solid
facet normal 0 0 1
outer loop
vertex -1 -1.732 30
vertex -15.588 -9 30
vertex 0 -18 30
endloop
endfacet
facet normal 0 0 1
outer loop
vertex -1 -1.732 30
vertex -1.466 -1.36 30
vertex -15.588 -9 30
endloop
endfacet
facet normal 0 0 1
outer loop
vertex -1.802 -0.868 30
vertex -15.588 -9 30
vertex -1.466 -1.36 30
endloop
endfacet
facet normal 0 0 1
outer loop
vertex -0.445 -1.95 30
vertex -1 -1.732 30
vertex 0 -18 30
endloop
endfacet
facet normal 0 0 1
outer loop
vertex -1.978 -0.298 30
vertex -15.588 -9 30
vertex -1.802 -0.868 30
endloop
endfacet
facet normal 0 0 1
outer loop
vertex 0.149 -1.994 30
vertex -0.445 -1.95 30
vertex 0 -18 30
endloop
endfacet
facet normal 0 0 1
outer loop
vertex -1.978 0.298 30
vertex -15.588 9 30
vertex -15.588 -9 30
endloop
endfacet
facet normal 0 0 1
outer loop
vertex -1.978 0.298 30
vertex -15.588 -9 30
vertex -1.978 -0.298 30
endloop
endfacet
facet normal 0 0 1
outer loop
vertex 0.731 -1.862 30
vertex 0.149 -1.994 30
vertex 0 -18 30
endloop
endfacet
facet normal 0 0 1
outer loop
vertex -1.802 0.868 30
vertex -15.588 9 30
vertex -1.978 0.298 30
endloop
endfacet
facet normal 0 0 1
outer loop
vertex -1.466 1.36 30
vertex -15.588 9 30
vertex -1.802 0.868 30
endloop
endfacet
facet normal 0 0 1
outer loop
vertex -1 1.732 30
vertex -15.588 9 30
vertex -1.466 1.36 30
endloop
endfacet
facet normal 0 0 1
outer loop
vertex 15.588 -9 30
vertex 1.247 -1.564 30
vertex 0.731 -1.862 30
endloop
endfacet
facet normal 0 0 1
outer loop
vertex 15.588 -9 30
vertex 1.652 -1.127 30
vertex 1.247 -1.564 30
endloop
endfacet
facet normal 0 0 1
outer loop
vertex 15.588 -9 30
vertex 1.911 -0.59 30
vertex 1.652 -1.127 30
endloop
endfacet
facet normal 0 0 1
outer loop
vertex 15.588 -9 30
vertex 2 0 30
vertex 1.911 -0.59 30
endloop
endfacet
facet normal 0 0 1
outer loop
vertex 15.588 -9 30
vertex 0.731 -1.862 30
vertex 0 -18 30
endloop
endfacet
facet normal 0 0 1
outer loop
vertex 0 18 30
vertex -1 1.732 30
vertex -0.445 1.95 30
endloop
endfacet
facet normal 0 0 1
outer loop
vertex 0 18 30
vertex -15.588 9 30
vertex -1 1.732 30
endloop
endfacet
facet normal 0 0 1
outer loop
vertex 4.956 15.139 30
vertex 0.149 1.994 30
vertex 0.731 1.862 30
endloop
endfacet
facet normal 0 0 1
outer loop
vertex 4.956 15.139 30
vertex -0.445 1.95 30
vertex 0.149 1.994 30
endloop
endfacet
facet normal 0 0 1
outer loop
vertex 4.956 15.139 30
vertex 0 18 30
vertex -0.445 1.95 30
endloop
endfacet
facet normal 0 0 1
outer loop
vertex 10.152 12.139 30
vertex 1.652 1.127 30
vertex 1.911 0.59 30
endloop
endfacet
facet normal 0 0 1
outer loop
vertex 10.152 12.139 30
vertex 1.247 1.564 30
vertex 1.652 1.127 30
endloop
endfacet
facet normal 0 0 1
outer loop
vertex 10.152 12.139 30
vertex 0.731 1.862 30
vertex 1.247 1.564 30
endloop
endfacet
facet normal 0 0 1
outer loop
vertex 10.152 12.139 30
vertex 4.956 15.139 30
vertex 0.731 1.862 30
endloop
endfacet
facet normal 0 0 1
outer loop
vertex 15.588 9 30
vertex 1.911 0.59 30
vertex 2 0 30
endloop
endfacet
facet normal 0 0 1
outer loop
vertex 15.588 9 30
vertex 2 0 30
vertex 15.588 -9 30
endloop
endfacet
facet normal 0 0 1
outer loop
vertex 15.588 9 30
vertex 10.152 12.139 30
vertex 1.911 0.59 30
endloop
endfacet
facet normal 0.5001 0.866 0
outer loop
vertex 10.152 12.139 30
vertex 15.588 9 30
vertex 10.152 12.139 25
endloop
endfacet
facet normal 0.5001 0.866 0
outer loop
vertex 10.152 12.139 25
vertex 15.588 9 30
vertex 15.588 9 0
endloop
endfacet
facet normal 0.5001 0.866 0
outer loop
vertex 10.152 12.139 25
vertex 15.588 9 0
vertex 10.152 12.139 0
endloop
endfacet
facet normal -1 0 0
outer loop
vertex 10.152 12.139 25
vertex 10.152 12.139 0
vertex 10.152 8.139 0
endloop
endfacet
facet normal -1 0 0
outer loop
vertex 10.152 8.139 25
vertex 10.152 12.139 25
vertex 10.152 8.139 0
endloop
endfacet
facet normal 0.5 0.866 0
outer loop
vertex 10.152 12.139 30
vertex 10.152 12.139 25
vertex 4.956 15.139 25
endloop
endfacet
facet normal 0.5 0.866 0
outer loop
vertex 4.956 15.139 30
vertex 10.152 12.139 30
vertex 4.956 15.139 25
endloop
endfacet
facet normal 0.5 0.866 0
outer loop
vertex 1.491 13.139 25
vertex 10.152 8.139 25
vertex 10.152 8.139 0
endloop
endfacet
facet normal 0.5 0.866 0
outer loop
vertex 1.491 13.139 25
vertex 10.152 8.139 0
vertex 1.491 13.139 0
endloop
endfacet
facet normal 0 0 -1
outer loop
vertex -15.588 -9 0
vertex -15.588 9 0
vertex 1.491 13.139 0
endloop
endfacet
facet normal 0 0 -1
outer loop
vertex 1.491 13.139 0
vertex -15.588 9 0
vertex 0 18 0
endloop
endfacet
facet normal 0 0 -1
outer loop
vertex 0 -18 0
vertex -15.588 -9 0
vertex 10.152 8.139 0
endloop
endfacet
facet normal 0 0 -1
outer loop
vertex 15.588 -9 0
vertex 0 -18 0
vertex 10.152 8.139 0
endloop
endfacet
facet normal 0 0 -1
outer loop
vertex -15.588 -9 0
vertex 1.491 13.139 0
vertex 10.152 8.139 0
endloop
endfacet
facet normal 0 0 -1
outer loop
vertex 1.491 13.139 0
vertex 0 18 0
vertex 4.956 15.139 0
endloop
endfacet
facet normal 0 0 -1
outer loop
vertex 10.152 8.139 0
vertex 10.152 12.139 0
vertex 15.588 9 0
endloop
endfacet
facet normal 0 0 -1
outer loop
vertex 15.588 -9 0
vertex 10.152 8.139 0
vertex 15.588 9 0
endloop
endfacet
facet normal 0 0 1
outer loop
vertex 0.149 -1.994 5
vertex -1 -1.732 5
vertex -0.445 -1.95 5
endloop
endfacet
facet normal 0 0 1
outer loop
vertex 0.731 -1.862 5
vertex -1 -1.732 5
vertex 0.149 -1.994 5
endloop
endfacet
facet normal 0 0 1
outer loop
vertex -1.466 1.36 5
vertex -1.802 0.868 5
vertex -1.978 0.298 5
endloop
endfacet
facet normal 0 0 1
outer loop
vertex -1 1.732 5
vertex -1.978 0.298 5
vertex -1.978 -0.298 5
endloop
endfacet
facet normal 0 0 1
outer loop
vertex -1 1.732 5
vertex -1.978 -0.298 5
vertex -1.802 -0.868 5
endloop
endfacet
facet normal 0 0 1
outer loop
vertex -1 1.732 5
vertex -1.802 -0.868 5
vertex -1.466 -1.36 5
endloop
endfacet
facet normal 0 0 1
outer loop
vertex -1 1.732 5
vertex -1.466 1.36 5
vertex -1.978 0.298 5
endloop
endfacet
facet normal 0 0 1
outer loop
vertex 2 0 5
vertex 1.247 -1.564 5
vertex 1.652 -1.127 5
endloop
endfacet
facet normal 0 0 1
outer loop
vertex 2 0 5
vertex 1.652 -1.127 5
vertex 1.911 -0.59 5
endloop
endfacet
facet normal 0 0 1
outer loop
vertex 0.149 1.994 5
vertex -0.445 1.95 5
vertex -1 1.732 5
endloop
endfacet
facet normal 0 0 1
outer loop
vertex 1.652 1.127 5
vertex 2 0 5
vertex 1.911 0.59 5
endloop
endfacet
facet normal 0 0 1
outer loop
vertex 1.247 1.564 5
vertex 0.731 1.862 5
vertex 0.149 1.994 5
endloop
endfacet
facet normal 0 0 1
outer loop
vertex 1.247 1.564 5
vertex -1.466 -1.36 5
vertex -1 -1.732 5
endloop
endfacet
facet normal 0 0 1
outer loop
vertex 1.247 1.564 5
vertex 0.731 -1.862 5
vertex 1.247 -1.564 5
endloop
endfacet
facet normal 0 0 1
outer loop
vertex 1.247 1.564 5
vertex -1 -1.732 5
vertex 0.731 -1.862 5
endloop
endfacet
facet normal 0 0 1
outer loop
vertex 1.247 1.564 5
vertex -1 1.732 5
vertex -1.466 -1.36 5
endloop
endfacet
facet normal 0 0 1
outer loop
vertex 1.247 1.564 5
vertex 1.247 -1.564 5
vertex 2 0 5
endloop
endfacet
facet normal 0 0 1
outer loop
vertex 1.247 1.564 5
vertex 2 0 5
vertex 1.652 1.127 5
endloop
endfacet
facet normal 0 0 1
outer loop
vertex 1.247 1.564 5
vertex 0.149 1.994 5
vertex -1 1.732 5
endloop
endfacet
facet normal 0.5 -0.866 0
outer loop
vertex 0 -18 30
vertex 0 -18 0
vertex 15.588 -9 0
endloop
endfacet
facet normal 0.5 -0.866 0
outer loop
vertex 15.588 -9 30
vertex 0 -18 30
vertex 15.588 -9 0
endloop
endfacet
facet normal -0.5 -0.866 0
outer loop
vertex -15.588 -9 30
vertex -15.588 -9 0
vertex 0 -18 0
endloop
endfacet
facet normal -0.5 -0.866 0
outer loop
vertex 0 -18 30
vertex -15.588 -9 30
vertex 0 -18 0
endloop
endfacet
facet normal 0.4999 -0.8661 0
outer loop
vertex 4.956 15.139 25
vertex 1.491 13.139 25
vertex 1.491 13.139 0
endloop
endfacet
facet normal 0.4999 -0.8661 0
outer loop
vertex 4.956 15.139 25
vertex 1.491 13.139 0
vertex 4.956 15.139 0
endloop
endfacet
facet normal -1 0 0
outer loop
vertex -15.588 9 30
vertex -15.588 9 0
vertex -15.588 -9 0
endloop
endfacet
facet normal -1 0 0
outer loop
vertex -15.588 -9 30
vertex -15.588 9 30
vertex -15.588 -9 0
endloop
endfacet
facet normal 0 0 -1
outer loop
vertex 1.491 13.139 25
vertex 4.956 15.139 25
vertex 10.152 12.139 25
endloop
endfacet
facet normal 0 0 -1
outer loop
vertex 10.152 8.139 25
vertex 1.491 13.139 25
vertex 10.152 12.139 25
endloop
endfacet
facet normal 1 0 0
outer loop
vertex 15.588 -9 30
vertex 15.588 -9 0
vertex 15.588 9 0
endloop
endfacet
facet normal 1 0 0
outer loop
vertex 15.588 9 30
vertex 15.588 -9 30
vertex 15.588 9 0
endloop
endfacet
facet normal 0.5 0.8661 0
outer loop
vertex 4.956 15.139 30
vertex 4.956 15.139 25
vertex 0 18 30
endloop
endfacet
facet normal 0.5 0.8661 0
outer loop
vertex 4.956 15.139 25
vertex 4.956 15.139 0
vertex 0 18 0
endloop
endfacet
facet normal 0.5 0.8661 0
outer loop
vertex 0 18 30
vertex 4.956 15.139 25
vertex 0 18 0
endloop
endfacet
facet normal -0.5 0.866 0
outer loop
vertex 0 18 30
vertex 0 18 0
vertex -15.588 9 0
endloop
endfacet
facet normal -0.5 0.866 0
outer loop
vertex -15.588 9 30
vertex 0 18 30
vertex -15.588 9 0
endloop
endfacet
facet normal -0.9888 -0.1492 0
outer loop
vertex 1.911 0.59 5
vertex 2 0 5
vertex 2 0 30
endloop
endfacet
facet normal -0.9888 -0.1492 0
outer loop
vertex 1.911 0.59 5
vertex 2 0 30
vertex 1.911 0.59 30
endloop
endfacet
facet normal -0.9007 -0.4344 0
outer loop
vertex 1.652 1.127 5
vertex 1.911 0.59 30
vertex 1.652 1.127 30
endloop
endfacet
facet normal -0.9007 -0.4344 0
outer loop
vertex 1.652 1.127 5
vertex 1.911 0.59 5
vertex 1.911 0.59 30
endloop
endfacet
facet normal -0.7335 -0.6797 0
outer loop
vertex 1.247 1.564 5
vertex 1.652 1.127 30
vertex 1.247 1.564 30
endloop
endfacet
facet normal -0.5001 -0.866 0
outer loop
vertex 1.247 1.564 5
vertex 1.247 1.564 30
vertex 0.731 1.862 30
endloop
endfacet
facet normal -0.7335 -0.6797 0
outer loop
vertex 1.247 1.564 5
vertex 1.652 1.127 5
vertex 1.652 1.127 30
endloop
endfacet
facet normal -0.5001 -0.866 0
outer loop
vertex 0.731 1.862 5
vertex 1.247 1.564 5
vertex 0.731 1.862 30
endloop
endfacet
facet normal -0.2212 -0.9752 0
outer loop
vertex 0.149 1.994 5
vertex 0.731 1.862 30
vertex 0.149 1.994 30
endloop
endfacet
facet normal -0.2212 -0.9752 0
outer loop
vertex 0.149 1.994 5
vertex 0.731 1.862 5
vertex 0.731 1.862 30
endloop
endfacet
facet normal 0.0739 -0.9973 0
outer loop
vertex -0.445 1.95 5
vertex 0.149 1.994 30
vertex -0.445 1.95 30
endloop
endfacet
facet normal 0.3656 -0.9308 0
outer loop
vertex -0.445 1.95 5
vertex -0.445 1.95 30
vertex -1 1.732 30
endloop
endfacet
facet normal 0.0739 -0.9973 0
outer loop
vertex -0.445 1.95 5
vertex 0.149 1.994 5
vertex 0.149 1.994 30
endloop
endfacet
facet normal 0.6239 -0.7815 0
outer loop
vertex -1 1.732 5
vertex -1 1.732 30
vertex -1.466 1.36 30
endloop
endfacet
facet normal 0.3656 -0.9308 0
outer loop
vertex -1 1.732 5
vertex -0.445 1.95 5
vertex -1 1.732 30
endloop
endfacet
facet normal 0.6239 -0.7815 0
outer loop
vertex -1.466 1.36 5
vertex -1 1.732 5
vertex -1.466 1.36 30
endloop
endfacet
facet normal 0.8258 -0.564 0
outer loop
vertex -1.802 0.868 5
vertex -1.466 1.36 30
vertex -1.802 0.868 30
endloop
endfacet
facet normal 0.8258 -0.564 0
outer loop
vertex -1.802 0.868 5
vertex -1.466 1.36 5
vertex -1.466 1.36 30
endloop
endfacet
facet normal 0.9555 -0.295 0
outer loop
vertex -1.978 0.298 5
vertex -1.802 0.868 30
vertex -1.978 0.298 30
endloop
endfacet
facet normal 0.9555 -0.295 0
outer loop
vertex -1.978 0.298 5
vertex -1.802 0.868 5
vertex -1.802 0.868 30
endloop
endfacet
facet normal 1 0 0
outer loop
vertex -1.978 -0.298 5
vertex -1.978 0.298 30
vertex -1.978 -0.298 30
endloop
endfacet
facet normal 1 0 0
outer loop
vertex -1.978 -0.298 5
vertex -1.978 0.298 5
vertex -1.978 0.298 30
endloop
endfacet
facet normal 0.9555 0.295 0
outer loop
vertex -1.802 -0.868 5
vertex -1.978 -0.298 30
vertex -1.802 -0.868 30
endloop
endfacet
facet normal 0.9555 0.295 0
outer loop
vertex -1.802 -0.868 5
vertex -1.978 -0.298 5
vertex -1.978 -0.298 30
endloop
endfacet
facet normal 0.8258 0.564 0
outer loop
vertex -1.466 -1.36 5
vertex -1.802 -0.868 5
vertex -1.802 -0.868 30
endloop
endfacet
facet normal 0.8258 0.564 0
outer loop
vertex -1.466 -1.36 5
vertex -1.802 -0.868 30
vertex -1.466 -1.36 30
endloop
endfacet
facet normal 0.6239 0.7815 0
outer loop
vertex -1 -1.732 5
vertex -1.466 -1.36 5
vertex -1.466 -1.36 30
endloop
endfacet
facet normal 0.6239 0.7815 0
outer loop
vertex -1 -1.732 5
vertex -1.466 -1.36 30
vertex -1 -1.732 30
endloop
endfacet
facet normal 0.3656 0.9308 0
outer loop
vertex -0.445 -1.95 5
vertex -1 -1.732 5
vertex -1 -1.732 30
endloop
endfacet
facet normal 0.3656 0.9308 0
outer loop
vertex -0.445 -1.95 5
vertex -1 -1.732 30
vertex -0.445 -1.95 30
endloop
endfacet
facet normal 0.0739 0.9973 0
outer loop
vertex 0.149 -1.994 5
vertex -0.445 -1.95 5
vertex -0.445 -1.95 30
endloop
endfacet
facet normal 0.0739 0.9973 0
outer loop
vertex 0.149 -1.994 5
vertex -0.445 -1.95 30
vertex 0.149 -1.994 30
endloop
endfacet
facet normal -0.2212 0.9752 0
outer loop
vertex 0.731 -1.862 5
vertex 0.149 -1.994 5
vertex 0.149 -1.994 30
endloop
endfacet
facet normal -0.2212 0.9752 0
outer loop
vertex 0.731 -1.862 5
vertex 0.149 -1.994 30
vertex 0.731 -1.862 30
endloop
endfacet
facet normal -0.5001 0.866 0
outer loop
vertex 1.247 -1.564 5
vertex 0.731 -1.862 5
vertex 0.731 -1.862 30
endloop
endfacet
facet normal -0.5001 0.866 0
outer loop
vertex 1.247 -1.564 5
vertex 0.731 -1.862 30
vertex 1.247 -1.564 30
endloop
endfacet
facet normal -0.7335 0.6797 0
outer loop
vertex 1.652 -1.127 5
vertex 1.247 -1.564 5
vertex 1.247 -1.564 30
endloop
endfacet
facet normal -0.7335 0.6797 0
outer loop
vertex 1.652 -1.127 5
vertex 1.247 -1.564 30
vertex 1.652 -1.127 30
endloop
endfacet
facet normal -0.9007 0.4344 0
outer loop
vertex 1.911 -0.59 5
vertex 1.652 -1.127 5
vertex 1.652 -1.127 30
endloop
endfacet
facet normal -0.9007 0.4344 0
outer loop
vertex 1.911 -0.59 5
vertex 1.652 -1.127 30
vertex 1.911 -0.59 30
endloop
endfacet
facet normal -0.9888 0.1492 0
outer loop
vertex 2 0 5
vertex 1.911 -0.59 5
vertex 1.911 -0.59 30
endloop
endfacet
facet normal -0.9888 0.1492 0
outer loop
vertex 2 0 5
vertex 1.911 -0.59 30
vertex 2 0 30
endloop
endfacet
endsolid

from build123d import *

# Parameters (mm, degrees)
F0_R     = 2
F1_DEPTH = 5
F2_DEPTH = 30
F3_START = 25
F3_DEPTH = 5


with BuildPart() as f1:
    # F0 (on Top) → F1 (new body)
    with BuildSketch(Plane.XY):
        Circle(F0_R)
    extrude(amount=F1_DEPTH)

    # F0 (on Top) → F2 (join)
    with BuildSketch(Plane.XY):
        Polygon((0, 18), (-15.5884572681, 9), (-15.5884572681, -9), (0, -18), (15.5884572681, -9), (15.5884572681, 9), (10.1517191776, 12.1389022001), (10.1517191776, 8.1389022001), (1.4914651398, 13.1389022001), (4.9555667549, 15.1389022001), align=None)
        Circle(F0_R, mode=Mode.SUBTRACT)
    extrude(amount=F2_DEPTH)

    # F0 (on Top) → F3 (join)
    with BuildSketch(Plane.XY.offset(F3_START)):
        Polygon((10.1517191776, 12.1389022001), (4.9555667549, 15.1389022001), (1.4914651398, 13.1389022001), (10.1517191776, 8.1389022001), align=None)
    extrude(amount=F3_DEPTH)


solid = f1.part
